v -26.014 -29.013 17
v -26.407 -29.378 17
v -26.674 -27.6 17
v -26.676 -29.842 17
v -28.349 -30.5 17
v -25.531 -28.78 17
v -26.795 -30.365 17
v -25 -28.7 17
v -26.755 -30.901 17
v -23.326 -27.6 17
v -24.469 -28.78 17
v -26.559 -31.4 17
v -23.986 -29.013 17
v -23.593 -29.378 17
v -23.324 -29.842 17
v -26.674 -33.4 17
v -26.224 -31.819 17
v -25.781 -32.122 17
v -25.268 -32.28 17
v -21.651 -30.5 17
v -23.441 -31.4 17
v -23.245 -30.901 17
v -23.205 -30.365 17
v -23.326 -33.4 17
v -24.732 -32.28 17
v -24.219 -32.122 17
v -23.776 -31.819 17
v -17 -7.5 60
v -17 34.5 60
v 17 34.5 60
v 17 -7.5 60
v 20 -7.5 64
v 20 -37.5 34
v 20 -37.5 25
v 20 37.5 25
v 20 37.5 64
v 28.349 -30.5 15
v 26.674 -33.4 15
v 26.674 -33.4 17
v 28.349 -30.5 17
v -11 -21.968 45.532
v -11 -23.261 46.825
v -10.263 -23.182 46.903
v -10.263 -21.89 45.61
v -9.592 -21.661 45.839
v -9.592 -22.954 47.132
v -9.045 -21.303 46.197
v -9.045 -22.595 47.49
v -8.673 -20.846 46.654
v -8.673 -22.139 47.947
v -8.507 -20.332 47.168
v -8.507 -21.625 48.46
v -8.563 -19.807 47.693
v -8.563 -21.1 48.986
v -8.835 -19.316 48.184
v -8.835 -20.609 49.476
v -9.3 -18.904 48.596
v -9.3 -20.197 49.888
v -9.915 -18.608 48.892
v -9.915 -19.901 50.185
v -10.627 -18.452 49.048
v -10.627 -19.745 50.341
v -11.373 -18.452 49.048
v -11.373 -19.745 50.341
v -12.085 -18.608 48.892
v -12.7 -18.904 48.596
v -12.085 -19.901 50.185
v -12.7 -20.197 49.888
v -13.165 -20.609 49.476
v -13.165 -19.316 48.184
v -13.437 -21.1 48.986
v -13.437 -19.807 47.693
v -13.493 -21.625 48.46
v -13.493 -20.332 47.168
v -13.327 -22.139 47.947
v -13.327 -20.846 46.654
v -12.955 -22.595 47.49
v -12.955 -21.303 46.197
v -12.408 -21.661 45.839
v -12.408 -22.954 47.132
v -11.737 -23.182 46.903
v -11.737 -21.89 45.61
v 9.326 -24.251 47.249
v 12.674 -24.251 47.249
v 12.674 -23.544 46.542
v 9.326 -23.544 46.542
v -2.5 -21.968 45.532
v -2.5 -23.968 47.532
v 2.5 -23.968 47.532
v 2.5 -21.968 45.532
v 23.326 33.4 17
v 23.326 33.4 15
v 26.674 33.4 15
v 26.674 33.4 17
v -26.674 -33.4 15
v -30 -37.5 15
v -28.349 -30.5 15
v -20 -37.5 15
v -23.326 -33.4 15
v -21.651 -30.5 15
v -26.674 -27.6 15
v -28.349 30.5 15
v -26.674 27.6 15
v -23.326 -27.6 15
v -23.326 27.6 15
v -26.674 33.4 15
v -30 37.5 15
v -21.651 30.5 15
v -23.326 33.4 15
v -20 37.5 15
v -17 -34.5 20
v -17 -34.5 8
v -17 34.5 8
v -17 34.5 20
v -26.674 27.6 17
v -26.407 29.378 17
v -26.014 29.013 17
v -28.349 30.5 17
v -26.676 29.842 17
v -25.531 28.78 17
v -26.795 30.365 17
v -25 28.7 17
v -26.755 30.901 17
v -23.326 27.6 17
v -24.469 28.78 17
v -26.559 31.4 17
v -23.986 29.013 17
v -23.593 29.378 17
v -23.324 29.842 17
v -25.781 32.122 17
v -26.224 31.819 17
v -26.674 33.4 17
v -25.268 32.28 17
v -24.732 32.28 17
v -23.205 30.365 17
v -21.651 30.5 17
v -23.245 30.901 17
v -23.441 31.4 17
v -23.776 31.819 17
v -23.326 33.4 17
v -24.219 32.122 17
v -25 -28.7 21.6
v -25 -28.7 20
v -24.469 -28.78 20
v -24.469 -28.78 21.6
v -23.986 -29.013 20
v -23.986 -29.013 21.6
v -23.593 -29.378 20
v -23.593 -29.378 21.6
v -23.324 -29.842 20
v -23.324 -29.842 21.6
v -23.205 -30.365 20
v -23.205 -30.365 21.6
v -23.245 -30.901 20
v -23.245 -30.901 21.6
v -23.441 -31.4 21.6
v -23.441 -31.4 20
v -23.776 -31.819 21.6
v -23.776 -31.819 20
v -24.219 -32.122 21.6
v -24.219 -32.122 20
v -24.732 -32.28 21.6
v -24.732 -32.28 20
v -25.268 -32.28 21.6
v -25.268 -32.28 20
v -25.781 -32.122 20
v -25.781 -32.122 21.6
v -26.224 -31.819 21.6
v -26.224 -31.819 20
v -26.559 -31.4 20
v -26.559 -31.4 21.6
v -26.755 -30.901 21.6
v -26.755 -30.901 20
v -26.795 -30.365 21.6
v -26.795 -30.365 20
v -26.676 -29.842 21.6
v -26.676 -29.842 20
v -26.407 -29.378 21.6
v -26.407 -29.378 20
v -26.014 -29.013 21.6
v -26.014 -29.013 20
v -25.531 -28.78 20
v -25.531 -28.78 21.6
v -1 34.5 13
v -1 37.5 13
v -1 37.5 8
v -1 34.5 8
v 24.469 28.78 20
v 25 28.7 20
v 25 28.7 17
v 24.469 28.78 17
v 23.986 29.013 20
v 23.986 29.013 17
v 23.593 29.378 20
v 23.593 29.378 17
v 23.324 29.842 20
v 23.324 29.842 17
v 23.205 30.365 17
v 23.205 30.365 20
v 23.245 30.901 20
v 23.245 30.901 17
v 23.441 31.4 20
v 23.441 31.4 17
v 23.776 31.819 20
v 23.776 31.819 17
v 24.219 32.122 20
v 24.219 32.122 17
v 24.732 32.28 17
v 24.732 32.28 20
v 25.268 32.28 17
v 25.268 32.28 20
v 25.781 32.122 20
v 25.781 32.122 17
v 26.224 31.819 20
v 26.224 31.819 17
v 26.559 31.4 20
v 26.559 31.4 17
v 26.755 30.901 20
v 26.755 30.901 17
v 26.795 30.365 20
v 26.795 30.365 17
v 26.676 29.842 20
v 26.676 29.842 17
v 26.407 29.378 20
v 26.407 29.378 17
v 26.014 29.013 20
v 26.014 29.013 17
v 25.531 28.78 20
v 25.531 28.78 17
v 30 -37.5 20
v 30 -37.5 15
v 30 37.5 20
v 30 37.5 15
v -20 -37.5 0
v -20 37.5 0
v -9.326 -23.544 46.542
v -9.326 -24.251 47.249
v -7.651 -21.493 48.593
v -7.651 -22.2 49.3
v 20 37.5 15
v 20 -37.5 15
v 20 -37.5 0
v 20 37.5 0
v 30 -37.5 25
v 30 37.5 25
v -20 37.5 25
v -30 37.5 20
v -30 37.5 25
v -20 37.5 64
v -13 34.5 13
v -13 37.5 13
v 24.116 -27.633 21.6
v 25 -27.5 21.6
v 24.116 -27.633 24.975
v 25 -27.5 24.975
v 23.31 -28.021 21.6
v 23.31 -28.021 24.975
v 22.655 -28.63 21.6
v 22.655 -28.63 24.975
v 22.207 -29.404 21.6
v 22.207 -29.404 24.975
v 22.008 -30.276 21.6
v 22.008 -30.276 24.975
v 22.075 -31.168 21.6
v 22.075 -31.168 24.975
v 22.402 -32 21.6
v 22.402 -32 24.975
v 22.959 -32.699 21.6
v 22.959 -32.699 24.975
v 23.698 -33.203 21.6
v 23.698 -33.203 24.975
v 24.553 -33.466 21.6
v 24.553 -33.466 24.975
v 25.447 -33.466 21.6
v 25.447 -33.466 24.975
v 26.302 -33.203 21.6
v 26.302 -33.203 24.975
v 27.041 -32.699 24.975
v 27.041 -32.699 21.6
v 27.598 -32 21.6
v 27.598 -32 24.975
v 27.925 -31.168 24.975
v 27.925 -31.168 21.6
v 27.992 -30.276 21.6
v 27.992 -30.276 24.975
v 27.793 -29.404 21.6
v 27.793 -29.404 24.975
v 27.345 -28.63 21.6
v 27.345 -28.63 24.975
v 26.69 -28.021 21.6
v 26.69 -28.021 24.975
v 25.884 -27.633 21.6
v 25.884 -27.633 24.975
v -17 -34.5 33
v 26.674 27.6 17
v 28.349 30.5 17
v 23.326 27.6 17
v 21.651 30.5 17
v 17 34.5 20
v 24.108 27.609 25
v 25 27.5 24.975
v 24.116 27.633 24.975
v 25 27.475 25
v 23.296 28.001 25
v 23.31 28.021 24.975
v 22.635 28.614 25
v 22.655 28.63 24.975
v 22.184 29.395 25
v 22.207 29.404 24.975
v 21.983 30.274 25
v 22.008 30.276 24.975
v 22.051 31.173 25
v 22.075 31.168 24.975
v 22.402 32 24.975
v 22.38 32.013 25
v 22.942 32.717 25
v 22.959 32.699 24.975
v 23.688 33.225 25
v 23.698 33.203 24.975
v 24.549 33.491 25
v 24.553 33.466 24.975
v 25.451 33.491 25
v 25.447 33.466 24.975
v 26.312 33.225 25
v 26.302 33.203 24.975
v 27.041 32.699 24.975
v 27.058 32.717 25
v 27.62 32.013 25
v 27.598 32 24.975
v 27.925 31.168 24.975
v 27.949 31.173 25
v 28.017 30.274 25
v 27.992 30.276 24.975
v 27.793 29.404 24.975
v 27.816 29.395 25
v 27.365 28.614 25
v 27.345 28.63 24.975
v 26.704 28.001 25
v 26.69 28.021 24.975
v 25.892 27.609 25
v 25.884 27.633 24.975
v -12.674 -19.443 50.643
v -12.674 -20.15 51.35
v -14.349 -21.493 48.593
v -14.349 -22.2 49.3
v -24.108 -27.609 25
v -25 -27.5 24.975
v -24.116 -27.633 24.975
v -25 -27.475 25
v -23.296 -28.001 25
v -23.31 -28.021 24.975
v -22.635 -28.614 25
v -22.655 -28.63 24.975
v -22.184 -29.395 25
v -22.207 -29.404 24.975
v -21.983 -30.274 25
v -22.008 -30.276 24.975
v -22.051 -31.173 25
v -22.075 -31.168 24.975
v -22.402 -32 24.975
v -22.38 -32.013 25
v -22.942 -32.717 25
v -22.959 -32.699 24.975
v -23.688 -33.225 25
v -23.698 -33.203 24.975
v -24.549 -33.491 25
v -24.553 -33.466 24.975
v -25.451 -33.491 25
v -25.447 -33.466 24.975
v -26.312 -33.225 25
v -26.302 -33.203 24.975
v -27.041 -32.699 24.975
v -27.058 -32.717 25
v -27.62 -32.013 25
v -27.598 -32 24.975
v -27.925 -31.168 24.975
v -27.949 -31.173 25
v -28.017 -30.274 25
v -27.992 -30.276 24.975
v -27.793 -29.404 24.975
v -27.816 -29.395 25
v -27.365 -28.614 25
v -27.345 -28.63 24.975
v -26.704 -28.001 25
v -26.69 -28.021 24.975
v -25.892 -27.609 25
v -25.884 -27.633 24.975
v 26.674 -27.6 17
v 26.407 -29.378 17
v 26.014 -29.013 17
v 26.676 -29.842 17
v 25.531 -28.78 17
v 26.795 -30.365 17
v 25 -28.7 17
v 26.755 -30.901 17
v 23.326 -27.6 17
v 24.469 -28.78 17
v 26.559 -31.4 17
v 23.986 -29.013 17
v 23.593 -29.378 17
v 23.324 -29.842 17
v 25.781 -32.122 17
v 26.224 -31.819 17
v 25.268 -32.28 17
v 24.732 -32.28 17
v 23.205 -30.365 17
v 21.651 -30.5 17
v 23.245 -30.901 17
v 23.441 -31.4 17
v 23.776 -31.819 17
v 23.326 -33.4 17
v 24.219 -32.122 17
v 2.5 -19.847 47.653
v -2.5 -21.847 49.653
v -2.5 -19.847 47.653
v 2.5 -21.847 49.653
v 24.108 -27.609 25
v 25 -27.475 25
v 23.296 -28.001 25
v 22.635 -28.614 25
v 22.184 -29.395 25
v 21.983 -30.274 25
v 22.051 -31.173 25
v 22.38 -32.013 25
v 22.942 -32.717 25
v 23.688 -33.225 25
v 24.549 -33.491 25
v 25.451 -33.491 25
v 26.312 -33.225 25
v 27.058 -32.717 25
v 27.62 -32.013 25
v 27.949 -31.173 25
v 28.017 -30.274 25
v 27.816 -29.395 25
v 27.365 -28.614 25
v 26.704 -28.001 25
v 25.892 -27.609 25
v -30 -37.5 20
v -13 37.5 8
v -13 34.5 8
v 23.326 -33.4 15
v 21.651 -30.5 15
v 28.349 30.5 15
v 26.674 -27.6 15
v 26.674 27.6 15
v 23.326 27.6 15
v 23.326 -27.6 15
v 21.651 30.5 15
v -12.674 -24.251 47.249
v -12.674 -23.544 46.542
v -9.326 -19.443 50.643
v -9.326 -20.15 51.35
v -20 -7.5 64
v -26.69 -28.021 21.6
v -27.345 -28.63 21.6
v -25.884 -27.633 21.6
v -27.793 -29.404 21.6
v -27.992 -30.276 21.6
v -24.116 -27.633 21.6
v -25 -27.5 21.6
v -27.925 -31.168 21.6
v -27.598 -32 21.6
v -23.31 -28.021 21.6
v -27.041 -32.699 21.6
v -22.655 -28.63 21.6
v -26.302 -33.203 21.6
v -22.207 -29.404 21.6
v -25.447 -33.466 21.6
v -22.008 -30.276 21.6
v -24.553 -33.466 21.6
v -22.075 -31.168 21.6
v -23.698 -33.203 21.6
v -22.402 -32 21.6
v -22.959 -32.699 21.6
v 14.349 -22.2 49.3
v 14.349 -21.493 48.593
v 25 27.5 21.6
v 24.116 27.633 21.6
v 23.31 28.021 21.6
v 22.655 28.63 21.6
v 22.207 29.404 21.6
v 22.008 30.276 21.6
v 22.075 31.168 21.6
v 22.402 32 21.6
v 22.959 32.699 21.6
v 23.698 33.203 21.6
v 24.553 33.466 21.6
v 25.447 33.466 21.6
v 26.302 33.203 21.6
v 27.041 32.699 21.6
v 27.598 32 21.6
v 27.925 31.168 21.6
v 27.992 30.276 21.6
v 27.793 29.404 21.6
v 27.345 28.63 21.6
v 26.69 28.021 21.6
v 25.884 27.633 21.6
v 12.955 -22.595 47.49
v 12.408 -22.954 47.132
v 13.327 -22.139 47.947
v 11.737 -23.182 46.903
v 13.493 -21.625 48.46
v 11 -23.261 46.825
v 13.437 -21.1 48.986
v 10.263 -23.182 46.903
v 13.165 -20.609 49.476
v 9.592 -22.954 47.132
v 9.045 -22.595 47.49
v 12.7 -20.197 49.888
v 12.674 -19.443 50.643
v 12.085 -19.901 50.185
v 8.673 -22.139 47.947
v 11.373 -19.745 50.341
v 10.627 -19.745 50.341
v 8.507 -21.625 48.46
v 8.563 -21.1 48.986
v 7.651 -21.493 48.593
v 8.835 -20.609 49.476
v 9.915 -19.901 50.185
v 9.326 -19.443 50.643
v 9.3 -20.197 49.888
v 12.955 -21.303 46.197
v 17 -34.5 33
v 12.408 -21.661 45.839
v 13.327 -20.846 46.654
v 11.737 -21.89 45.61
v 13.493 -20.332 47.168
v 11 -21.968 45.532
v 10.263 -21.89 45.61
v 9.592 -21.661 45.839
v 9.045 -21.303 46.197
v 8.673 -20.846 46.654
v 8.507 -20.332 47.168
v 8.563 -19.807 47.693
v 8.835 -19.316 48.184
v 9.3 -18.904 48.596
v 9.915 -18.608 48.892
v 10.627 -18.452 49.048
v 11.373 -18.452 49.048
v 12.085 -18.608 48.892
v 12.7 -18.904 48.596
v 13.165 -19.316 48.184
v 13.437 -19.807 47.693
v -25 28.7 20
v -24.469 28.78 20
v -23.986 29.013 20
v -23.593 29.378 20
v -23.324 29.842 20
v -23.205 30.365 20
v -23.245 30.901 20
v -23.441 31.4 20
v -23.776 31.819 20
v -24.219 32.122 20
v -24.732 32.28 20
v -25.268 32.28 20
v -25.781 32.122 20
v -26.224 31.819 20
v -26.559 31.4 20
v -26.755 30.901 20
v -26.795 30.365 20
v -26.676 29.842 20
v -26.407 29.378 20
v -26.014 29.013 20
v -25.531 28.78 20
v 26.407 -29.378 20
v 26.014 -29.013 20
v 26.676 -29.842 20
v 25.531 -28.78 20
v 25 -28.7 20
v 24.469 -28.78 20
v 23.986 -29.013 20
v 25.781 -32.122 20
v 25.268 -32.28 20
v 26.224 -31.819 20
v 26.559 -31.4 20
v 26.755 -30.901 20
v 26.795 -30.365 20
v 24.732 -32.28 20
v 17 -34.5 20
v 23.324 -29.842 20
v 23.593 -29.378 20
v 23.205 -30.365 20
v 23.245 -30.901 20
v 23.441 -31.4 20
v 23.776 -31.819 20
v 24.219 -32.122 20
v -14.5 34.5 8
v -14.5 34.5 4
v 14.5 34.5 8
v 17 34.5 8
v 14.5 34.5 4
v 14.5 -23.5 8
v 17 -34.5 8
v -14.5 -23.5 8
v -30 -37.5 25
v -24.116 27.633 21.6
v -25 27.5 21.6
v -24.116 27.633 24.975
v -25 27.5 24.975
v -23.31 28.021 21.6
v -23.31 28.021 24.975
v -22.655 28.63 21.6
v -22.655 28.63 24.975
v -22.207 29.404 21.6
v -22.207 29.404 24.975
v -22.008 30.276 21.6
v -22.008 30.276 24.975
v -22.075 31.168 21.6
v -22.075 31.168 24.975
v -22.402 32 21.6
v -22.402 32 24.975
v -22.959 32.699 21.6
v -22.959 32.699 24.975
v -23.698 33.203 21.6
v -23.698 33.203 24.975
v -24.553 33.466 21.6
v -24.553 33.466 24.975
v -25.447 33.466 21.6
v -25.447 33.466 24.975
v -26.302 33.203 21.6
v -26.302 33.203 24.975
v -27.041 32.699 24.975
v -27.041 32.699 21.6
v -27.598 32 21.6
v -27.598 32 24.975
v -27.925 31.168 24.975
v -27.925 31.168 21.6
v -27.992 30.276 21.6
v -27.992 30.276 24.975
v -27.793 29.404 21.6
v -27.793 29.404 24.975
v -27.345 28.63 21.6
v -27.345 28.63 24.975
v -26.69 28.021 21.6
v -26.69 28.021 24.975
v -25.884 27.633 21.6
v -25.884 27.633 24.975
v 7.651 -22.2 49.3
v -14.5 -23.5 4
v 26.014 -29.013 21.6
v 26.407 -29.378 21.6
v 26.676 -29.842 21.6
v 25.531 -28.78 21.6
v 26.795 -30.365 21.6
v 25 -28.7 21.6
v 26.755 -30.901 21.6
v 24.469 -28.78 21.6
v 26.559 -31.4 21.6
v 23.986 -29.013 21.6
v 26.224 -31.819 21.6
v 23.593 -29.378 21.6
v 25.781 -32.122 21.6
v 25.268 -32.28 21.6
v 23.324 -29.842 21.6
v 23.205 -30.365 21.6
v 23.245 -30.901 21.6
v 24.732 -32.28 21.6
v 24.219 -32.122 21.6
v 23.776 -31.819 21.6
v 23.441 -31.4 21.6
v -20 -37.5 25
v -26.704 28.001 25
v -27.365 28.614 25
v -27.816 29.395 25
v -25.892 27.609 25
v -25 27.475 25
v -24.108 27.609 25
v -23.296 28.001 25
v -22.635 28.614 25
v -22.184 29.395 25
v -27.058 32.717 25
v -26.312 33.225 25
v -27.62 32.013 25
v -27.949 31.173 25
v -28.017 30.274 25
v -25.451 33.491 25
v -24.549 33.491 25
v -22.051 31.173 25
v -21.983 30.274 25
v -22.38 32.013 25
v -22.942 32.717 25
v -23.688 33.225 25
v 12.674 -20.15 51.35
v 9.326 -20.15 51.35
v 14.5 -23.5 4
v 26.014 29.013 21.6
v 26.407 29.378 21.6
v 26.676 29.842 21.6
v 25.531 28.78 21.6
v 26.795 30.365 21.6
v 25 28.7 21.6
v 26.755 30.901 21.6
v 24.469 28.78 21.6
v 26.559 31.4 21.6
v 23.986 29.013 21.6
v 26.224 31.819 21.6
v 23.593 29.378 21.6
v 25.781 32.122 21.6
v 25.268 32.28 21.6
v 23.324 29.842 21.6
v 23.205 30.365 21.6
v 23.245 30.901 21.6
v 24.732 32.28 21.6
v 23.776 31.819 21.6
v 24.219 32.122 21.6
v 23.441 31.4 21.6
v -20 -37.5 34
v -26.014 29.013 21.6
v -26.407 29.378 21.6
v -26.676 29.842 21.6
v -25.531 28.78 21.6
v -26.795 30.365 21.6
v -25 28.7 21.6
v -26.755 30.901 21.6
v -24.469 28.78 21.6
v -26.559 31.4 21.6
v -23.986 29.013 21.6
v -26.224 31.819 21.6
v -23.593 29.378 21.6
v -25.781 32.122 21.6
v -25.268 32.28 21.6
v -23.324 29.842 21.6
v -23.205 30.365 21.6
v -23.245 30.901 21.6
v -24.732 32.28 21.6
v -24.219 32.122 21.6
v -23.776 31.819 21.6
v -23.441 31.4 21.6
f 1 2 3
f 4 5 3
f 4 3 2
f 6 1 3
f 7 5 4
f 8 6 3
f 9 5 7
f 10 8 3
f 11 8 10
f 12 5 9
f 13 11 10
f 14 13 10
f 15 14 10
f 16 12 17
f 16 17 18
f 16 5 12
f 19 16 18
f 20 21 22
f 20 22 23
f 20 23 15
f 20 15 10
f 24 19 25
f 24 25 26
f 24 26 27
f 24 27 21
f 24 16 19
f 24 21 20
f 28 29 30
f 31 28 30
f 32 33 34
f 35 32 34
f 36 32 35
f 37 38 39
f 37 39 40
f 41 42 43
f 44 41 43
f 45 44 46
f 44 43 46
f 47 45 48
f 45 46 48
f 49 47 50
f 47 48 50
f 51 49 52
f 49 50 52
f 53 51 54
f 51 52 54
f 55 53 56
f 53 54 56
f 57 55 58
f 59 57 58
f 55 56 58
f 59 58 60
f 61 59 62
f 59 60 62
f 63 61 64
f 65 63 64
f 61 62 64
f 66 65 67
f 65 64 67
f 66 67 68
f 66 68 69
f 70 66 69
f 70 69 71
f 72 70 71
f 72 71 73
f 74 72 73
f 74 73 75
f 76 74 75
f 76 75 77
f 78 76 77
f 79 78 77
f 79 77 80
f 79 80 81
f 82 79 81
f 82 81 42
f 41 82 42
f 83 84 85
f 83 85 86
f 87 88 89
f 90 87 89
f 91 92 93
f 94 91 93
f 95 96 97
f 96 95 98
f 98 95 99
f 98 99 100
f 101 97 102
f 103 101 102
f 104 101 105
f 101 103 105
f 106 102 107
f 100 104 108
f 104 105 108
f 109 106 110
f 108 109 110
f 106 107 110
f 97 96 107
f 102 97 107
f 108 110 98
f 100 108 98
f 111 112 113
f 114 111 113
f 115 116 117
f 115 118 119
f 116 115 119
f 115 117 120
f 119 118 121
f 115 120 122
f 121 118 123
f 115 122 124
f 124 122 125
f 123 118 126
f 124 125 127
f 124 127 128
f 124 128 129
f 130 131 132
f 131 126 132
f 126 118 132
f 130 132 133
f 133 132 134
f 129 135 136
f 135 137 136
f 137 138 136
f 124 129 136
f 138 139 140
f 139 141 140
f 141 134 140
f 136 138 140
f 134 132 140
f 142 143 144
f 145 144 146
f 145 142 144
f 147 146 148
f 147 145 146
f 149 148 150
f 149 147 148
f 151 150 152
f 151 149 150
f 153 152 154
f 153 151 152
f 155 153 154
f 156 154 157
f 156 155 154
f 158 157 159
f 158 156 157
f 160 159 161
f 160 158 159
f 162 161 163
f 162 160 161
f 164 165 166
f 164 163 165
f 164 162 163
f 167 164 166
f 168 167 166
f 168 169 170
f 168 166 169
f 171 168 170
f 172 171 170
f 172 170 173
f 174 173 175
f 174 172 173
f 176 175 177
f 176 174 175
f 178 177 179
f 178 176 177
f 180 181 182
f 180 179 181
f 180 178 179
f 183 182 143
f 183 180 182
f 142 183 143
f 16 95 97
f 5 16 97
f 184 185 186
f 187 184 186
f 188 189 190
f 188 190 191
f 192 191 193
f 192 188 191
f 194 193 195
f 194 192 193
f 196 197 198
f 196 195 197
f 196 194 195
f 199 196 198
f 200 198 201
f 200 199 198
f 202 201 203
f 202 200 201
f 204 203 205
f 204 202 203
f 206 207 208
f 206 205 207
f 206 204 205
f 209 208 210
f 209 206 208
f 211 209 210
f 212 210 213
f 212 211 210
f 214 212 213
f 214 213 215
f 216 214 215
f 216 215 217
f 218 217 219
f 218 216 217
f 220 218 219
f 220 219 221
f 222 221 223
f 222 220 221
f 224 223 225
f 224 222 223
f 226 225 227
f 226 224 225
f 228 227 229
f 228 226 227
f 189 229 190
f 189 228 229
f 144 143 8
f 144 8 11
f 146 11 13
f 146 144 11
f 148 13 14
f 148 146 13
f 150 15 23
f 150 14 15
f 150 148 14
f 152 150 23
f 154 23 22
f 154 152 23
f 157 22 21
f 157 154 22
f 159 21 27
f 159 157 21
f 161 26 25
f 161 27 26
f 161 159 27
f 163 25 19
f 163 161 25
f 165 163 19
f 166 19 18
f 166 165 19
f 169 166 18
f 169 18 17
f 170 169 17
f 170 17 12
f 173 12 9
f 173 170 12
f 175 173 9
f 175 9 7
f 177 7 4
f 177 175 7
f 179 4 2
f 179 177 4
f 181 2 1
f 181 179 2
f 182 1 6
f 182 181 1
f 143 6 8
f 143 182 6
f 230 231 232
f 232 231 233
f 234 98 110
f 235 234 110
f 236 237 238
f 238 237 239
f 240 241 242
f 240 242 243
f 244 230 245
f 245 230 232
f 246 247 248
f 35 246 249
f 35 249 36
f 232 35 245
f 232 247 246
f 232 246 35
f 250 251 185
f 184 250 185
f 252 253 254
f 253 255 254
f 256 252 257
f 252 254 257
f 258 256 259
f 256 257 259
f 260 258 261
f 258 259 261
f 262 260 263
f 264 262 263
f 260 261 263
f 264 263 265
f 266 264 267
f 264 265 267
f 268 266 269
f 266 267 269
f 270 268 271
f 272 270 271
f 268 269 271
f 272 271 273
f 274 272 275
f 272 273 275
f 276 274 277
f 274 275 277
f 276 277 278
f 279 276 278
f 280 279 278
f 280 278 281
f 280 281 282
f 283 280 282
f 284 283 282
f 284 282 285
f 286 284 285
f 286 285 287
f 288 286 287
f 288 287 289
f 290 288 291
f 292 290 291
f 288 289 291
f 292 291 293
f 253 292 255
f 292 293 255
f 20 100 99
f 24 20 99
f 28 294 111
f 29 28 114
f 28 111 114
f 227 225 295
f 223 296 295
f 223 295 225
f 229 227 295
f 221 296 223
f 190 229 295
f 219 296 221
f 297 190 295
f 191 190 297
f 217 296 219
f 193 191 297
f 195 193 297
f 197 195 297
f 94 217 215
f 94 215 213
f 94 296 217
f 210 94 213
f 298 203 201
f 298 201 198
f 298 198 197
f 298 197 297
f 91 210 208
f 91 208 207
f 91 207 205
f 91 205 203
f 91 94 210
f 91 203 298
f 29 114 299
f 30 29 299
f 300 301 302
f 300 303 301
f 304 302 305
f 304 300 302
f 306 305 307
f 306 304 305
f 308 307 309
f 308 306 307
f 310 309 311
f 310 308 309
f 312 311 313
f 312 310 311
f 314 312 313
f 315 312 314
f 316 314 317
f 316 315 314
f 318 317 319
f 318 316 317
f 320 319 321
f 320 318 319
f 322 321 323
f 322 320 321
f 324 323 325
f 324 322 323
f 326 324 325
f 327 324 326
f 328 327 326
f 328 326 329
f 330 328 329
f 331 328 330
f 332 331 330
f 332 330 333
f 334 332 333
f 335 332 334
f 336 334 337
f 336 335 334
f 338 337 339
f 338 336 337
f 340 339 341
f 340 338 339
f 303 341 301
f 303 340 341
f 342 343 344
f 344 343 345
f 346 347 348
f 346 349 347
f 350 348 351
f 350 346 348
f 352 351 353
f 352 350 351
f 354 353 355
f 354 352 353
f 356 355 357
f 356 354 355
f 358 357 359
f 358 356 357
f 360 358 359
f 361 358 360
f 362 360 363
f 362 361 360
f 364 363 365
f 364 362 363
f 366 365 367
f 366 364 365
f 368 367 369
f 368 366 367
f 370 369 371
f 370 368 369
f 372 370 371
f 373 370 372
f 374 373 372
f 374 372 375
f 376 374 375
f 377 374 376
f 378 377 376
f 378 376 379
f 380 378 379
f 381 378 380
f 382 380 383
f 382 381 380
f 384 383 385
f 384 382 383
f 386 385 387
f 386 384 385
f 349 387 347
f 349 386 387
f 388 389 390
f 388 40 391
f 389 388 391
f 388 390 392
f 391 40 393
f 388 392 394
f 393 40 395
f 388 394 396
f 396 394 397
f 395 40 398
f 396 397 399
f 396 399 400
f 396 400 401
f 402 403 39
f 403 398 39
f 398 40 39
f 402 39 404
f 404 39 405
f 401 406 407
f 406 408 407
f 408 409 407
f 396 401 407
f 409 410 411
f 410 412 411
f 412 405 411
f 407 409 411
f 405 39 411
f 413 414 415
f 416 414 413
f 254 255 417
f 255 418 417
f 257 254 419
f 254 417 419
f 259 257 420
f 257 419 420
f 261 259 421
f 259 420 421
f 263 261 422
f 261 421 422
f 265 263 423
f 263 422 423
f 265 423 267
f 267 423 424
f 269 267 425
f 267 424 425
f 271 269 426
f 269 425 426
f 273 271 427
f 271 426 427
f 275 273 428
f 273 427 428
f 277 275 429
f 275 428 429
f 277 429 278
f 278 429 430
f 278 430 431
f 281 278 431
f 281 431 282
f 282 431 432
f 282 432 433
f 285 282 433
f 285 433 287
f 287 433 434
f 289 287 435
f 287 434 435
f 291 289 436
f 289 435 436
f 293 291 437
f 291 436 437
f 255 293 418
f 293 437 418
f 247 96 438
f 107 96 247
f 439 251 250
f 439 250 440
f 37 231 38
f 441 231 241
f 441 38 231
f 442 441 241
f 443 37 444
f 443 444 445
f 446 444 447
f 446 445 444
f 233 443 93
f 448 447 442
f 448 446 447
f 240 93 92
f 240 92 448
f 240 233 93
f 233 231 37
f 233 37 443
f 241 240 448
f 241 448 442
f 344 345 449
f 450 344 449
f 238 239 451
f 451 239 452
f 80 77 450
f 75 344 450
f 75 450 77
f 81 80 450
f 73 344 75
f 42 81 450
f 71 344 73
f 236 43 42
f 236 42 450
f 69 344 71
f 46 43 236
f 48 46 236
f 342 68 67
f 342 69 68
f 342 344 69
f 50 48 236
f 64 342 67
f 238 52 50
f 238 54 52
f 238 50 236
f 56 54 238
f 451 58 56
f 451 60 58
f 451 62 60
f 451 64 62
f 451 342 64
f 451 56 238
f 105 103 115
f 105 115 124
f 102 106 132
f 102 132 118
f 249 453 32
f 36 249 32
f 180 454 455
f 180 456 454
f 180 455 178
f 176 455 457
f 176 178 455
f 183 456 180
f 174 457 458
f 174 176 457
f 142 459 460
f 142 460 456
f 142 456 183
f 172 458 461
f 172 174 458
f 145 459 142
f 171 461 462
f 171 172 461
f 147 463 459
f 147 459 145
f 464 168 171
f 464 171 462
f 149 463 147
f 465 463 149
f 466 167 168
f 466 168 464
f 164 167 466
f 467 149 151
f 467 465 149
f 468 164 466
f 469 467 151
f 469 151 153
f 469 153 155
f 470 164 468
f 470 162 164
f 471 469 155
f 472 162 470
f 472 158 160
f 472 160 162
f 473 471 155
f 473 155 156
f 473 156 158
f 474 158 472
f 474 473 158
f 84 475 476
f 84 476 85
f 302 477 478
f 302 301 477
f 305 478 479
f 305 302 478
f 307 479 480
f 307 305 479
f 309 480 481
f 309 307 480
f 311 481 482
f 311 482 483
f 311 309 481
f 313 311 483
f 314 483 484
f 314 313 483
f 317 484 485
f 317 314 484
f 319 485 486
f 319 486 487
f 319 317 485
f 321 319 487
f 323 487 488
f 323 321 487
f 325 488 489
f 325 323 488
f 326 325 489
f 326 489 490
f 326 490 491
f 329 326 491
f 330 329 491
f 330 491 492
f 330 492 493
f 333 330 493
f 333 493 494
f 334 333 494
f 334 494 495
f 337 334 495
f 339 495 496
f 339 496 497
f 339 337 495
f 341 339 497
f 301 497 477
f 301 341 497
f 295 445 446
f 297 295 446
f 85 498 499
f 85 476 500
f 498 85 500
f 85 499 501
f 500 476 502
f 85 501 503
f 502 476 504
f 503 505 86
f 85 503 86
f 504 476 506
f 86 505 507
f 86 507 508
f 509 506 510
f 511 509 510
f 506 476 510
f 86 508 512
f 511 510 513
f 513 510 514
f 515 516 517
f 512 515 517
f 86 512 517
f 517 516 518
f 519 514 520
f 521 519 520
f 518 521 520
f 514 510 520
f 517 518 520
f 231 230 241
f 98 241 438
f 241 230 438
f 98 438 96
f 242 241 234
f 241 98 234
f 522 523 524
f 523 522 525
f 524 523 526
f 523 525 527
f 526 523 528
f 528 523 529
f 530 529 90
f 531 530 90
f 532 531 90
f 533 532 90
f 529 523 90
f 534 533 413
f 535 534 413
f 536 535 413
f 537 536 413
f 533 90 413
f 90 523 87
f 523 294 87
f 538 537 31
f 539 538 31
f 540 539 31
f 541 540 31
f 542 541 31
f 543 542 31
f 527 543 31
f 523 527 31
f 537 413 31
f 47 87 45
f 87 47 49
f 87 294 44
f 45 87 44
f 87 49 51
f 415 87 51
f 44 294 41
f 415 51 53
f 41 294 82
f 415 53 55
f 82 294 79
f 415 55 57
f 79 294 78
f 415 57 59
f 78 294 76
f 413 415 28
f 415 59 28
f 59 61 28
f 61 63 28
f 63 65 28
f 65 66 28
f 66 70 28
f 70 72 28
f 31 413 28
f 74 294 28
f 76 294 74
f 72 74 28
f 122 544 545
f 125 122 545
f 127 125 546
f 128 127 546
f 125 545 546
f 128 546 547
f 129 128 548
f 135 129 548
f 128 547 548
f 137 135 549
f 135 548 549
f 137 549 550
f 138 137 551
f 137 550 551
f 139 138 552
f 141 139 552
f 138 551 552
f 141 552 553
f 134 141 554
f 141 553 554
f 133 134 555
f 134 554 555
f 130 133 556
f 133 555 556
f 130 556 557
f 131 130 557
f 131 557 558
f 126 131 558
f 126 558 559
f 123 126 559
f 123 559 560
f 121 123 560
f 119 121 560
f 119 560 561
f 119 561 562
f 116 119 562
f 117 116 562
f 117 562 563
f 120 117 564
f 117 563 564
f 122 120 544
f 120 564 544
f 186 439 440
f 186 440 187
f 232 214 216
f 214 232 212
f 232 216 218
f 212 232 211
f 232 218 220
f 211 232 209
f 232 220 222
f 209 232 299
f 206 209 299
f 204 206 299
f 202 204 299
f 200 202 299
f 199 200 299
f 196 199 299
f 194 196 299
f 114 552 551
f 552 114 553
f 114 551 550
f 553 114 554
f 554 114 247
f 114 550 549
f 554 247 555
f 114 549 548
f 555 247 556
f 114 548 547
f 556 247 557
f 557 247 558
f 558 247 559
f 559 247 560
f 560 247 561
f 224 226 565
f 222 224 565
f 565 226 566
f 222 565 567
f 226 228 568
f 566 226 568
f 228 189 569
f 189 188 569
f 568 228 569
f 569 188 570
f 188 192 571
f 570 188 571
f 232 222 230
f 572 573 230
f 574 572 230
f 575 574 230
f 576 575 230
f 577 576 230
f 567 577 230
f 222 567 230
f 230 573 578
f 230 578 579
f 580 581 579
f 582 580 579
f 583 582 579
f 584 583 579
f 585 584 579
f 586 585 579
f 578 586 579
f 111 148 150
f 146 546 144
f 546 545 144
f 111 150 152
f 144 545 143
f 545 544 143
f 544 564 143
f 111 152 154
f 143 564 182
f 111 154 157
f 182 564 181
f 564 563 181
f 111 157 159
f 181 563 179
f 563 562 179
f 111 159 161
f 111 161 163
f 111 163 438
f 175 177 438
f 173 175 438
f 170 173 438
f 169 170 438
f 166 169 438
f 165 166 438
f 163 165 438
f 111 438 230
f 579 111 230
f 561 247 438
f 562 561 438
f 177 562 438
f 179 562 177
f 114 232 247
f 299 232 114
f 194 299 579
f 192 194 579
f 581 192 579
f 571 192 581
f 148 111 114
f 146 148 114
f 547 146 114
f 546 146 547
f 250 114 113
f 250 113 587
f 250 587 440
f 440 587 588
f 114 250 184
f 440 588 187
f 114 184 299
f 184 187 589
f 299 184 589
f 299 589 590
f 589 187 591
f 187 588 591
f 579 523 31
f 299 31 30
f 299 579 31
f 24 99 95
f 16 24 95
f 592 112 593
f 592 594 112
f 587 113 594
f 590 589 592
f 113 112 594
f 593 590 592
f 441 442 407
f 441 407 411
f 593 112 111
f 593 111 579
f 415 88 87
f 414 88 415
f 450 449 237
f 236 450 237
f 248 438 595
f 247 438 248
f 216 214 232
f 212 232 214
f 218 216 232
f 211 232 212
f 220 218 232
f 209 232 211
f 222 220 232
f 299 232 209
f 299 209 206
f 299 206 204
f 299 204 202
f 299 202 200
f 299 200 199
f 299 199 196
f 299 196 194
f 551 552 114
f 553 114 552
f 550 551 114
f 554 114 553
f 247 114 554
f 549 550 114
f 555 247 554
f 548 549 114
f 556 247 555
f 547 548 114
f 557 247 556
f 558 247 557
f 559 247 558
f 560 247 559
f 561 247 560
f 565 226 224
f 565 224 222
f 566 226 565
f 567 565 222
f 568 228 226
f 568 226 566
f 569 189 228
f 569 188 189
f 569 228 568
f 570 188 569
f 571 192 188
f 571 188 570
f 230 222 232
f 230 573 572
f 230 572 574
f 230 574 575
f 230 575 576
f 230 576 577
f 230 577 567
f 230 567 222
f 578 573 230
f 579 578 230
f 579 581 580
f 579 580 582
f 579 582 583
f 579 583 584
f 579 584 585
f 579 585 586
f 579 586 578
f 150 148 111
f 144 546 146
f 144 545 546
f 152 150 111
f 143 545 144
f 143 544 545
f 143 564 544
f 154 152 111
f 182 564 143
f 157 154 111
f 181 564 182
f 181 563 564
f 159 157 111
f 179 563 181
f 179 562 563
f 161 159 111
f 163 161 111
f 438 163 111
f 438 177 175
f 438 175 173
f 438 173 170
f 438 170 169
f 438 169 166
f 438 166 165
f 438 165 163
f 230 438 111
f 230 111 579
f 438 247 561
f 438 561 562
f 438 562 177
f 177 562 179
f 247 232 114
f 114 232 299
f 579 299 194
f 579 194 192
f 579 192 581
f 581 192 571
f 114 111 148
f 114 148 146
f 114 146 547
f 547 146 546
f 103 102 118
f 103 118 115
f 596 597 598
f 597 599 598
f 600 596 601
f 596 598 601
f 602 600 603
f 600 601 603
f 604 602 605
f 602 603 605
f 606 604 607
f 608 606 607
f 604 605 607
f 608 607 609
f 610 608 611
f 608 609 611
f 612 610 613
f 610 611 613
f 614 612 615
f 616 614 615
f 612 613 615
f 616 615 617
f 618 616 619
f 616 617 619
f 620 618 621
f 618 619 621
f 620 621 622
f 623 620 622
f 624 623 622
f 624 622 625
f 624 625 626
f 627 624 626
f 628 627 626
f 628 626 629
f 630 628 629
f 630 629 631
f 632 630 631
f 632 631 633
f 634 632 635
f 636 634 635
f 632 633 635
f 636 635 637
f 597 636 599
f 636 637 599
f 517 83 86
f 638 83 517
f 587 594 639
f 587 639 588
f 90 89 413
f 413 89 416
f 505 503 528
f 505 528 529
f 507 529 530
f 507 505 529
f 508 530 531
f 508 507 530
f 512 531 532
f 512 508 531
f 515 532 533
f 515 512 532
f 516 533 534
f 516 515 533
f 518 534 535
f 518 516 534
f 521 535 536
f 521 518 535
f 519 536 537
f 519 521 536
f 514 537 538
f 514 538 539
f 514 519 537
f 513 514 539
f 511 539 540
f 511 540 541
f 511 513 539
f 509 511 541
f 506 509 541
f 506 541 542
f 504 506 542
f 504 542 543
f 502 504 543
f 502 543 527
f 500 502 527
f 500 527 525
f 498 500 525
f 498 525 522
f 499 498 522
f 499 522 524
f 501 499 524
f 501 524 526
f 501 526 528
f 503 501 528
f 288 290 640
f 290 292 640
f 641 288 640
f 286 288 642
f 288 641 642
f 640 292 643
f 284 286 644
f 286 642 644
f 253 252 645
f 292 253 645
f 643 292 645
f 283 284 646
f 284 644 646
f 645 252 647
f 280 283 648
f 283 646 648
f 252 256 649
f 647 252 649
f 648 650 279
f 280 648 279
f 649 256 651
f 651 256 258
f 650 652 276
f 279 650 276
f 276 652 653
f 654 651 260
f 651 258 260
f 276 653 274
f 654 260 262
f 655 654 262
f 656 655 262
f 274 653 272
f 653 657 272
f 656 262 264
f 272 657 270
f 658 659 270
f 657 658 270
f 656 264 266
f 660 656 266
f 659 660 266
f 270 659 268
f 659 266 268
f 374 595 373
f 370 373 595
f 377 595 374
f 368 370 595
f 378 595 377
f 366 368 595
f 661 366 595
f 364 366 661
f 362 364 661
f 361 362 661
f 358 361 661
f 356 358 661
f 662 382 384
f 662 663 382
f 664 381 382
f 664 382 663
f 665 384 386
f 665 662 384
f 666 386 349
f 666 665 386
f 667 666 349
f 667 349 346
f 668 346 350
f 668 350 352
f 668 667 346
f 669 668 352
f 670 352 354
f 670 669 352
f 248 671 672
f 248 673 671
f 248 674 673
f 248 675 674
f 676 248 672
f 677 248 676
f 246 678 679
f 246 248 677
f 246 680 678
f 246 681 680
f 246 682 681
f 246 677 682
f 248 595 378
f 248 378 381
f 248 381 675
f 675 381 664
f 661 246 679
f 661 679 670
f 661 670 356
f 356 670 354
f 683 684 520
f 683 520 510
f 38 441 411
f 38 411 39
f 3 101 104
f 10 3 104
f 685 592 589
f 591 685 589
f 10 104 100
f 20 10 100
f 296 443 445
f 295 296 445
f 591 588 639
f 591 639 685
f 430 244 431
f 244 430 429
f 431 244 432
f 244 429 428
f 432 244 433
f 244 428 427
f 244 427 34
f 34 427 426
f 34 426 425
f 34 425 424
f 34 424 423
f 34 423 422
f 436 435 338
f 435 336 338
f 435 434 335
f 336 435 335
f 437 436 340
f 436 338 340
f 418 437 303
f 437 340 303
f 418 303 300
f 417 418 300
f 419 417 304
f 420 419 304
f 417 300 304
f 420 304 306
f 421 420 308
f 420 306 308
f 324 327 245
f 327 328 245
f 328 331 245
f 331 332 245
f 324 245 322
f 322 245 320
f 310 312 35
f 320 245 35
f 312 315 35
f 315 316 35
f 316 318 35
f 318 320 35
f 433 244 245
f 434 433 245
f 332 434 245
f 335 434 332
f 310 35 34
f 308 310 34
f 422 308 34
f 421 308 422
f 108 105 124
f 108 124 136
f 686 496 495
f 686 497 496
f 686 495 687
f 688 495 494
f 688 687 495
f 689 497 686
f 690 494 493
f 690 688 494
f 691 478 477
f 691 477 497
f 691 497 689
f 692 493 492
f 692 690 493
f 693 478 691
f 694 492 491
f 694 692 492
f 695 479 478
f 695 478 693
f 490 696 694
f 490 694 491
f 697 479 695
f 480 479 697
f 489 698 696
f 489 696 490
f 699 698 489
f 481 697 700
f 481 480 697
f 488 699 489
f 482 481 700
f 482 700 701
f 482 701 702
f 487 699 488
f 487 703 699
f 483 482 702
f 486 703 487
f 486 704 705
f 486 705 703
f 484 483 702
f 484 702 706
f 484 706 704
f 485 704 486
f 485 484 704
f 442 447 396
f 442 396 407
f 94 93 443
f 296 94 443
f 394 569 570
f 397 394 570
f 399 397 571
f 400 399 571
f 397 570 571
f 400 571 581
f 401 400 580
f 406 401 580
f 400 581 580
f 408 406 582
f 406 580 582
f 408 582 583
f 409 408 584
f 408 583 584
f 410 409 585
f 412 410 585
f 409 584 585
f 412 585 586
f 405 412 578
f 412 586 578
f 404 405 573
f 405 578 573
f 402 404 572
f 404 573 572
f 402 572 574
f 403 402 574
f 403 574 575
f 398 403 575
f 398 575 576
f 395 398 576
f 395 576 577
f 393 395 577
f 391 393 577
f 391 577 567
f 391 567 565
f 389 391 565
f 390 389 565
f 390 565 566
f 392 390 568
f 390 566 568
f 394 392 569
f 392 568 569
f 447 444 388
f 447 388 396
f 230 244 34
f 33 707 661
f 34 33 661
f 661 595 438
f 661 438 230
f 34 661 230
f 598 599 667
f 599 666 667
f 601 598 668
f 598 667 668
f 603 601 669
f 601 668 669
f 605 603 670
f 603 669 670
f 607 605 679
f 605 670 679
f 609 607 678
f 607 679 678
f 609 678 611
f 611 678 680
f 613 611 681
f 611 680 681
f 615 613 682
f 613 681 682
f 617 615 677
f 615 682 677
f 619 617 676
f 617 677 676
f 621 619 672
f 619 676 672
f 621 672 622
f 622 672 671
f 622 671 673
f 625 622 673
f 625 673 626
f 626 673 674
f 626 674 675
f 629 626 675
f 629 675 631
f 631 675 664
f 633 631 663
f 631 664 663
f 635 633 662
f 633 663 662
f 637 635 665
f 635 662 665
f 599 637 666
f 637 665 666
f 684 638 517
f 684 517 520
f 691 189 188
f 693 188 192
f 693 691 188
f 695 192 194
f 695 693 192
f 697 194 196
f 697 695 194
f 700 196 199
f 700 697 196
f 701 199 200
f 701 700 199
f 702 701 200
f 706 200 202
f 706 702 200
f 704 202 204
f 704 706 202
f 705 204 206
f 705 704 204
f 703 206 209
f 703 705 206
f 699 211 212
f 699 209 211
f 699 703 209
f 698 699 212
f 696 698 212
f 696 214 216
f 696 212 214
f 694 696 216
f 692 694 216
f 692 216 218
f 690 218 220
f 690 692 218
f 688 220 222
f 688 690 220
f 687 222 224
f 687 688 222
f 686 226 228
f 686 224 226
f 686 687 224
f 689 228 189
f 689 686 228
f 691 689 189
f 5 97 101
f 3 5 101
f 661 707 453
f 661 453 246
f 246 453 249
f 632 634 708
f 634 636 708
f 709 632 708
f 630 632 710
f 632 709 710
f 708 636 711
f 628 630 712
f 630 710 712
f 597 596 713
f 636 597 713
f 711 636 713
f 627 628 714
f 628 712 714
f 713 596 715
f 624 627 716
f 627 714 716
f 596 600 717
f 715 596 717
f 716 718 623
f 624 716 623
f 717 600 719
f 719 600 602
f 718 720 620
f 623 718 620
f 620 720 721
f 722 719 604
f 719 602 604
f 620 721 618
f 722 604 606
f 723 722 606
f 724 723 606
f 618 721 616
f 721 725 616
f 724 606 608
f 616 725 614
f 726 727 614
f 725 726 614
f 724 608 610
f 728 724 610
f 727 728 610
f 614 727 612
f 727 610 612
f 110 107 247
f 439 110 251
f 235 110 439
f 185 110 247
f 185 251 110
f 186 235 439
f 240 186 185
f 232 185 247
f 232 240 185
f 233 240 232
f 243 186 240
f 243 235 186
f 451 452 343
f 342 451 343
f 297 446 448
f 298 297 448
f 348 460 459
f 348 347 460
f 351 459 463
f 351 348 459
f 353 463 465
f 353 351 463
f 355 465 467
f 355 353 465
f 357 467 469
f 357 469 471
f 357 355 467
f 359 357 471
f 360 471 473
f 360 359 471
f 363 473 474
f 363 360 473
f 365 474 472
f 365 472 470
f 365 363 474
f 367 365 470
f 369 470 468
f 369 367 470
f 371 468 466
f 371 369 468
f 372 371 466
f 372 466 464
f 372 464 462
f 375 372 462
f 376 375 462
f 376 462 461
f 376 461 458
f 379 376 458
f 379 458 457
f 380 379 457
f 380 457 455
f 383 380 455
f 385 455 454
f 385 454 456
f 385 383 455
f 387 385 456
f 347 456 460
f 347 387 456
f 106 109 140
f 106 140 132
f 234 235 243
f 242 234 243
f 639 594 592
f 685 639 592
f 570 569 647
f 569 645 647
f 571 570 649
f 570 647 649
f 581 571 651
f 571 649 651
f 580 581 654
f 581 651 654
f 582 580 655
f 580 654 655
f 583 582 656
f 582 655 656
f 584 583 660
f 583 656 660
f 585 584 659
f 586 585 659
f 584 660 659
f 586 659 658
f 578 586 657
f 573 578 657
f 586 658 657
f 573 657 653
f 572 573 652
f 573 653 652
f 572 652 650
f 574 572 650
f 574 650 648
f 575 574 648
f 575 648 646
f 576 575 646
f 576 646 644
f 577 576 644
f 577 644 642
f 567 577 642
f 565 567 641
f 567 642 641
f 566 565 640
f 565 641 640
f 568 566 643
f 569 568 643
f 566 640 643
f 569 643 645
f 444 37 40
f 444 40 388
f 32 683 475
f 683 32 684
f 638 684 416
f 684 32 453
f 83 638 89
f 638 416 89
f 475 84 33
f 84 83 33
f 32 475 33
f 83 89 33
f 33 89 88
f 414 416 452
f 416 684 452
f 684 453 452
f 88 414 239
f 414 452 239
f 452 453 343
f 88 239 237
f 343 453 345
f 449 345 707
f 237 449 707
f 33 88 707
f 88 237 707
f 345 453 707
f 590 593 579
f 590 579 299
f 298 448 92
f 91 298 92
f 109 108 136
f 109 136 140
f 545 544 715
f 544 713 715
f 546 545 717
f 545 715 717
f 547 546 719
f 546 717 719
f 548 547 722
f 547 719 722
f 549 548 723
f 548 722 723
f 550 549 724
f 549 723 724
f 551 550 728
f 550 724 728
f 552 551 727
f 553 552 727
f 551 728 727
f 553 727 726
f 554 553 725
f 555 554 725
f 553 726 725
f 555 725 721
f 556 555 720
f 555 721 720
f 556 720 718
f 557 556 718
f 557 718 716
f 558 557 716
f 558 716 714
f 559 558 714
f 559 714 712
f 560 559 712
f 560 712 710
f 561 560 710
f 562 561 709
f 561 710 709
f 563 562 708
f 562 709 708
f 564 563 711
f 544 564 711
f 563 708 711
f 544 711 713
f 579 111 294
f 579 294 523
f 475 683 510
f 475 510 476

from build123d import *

# Parameters (mm, degrees)
SKETCH_1_W                     = 40
SKETCH_1_H                     = 75
EXTRUDE_1_DEPTH                = 30
SHELL_1_T                      = -3
SKETCH_2_W                     = 34
SKETCH_2_H                     = 69
EXTRUDE_2_DEPTH                = 5
SKETCH_3_W                     = 29
SKETCH_3_H                     = 58
CUT_EXTRUDE_1_DEPTH            = 4
SKETCH_4_W                     = 12
SKETCH_4_H                     = 5
CUT_EXTRUDE_2_DEPTH            = 3
SKETCH_5_W                     = 40
SKETCH_5_H                     = 75
SKETCH_5_W_2                   = 34
SKETCH_5_H_2                   = 69
EXTRUDE_5_DEPTH                = 30
CUT_EXTRUDE_START              = -40
CUT_EXTRUDE_5_DEPTH            = 40
SKETCH_8_W                     = 40
SKETCH_8_H                     = 45
EXTRUDE_6_DEPTH                = 4
SWEEP_START                    = -20
SWEEP_1_DEPTH                  = 40
CUT_EXTRUDE_6_REACH            = 85.926
SKETCH_12_R                    = 2.5
CUT_EXTRUDE_7_REACH            = 85.926
SKETCH_14_W                    = 5
SKETCH_14_H                    = 3
SKETCH_22_W                    = 10
SKETCH_22_H                    = 75
EXTRUDE_8_DEPTH                = 5
CUT_EXTRUDE_9_DEPTH            = 2
MIRROR_6_COPY_2_DEPTH          = 2
SPLIT_BODIES_2_SURFACE_1_BACK  = 116.417
SPLIT_BODIES_2_SURFACE_1_DEPTH = 232.834
SPLIT_BODIES_2_SURFACE_2_BACK  = 116.417
SPLIT_BODIES_2_SURFACE_2_DEPTH = 232.834
CUT_EXTRUDE_10_DEPTH           = 1


# Read off the part's stored shape, not the designer's step: 切除-拉伸5, 扫描1
with BuildPart() as part:
    # 草图1 → 凸台-拉伸1 (new body)
    with BuildSketch(Plane.XY):
        Rectangle(SKETCH_1_W, SKETCH_1_H)
    extrude(amount=EXTRUDE_1_DEPTH)

    # 抽壳1
    shell_1_openings = [part.faces().sort_by_distance(p)[0] for p in [
        (0, 0, 30),
    ]]
    offset(amount=SHELL_1_T, openings=shell_1_openings, kind=Kind.INTERSECTION)

    # 草图2 → 凸台-拉伸2 (add)
    with BuildSketch(Plane.XY.offset(3)):
        Rectangle(SKETCH_2_W, SKETCH_2_H)
    extrude(amount=EXTRUDE_2_DEPTH)

    # 草图3 → 切除-拉伸1 (cut)
    with BuildSketch(Plane.XY.offset(8)):
        with Locations((0, 5.5)):
            Rectangle(SKETCH_3_W, SKETCH_3_H)
    extrude(amount=-CUT_EXTRUDE_1_DEPTH, mode=Mode.SUBTRACT)

    # 草图4 → 切除-拉伸2 (cut)
    with BuildSketch(Plane(origin=(0, 37.5, 0), x_dir=(1, 0, 0), z_dir=(0, 1, 0))):
        with Locations((-7, -10.5)):
            Rectangle(SKETCH_4_W, SKETCH_4_H)
    extrude(amount=-CUT_EXTRUDE_2_DEPTH, mode=Mode.SUBTRACT)

    # 草图5 → 凸台-拉伸5 (add)
    with BuildSketch(Plane.XY.offset(30)):
        Rectangle(SKETCH_5_W, SKETCH_5_H)
        Rectangle(SKETCH_5_W_2, SKETCH_5_H_2, mode=Mode.SUBTRACT)
    extrude(amount=EXTRUDE_5_DEPTH)

    # 切除-拉伸5 outline → 切除-拉伸5 (cut)
    with BuildSketch(Plane.ZY.offset(20).offset(CUT_EXTRUDE_START)):
        Polygon((60, -7.5), (30, -37.5), (60, -37.5), align=None)
    extrude(amount=CUT_EXTRUDE_5_DEPTH, mode=Mode.SUBTRACT)

    # 草图8 → 凸台-拉伸6 (add)
    with BuildSketch(Plane.XY.offset(60)):
        with Locations((0, 15)):
            Rectangle(SKETCH_8_W, SKETCH_8_H)
    extrude(amount=EXTRUDE_6_DEPTH)

    # 扫描1 outline → 扫描1 (add)
    with BuildSketch(Plane.YZ.offset(SWEEP_START)):
        Polygon((-37.5, 34), (-37.5, 30), (-7.5, 60), (-7.5, 64), align=None)
    extrude(amount=SWEEP_1_DEPTH)

    # 草图12 → 切除-拉伸6 (cut, up to next)
    with BuildSketch(Plane(origin=(0, -35.75, 35.75), x_dir=(1, 0, 0), z_dir=(0, -0.7071067811865487, 0.7071067811865465)), mode=Mode.PRIVATE) as cut_extrude_6_sk1:
        with Locations(Location((-11, 19.162131789, 0), (0, 0, 270))):
            Circle(SKETCH_12_R)
    cut_extrude_6_tool1 = extrude(cut_extrude_6_sk1.sketch, amount=-CUT_EXTRUDE_6_REACH, mode=Mode.PRIVATE) & part.part
    cut_extrude_6 = cut_extrude_6_tool1.solids().sort_by_distance((-11, -22.200327, 49.299673))[0]
    add(cut_extrude_6, mode=Mode.SUBTRACT)

    # 镜向1: 切除-拉伸6 across plane
    add(cut_extrude_6.mirror(Plane(origin=(0, 0, 0), x_dir=(0, 0, 1), z_dir=(1, 0, 0))), mode=Mode.SUBTRACT)

    # 草图14 → 切除-拉伸7 (cut, up to next)
    with BuildSketch(Plane(origin=(0, -35.75, 35.75), x_dir=(1, 0, 0), z_dir=(0, -0.7071067811865487, 0.7071067811865465)), mode=Mode.PRIVATE) as cut_extrude_7_sk1:
        with Locations((0, 18.162131789)):
            Rectangle(SKETCH_14_W, SKETCH_14_H)
    cut_extrude_7_tool1 = extrude(cut_extrude_7_sk1.sketch, amount=-CUT_EXTRUDE_7_REACH, mode=Mode.PRIVATE) & part.part
    add(cut_extrude_7_tool1.solids().sort_by_distance((0, -22.907433, 48.592567))[0], mode=Mode.SUBTRACT)

    # 草图22 → 凸台-拉伸8 (add, symmetric)
    with BuildSketch(Plane(origin=(0, 0, 20), x_dir=(-1, 0, 0), z_dir=(0, 0, -1))):
        with Locations((-25, 0)):
            Rectangle(SKETCH_22_W, SKETCH_22_H)
    extrude_8 = extrude(amount=EXTRUDE_8_DEPTH, both=True)

    # 草图24 → M3 六角圆柱头螺钉的柱形沉头孔2 (revolve, cut)
    with BuildSketch(Plane(origin=(25, 30.5, 25), x_dir=(0, -1, 0), z_dir=(1, 0, 0))):
        Polygon((0, 0), (0, 10), (1.8, 10), (1.8, 3.4), (3, 3.4), (3, 0.025), (3.025, 0), align=None)
    hole_wizard_m3_2 = revolve(axis=Axis((25, 30.5, 31.35), (0, 0, -1)), mode=Mode.SUBTRACT)

    # 草图25 → 切除-拉伸9 (cut)
    with BuildSketch(Plane(origin=(0, 0, 15), x_dir=(-1, 0, 0), z_dir=(0, 0, -1))):
        Polygon((-28.348631561, 30.5), (-26.674315781, 27.6), (-23.325684219, 27.6), (-21.651368439, 30.5), (-23.325684219, 33.4), (-26.674315781, 33.4), align=None)
    cut_extrude_9 = extrude(amount=-CUT_EXTRUDE_9_DEPTH, mode=Mode.SUBTRACT)

    # 镜向4: M3 六角圆柱头螺钉的柱形沉头孔2, 切除-拉伸9 across plane
    add(hole_wizard_m3_2.mirror(Plane.ZX), mode=Mode.SUBTRACT)
    add(cut_extrude_9.mirror(Plane.ZX), mode=Mode.SUBTRACT)

    # 镜向6: 凸台-拉伸8, M3 六角圆柱头螺钉的柱形沉头孔2, 切除-拉伸9 across plane
    add(extrude_8.mirror(Plane(origin=(0, 0, 0), x_dir=(0, 0, 1), z_dir=(1, 0, 0))))
    add(hole_wizard_m3_2.mirror(Plane(origin=(0, 0, 0), x_dir=(0, 0, 1), z_dir=(1, 0, 0))), mode=Mode.SUBTRACT)
    add(cut_extrude_9.mirror(Plane(origin=(0, 0, 0), x_dir=(0, 0, 1), z_dir=(1, 0, 0))), mode=Mode.SUBTRACT)

    # 镜向6 copy 1 sketch → 镜向6 copy 1 (revolve, cut)
    with BuildSketch(Plane(origin=(-25, -30.5, 25), x_dir=(0, 1, 0), z_dir=(-1, 0, 0))):
        Polygon((0, 0), (0, 10), (1.8, 10), (1.8, 3.4), (3, 3.4), (3, 0.025), (3.025, 0), align=None)
    revolve(axis=Axis((-25, -30.5, 31.35), (0, 0, -1)), mode=Mode.SUBTRACT)

    # 镜向6 copy 2 sketch → 镜向6 copy 2 (cut)
    with BuildSketch(Plane(origin=(0, 0, 15), x_dir=(1, 0, 0), z_dir=(0, 0, -1))):
        Polygon((-28.348631561, 30.5), (-26.674315781, 27.6), (-23.325684219, 27.6), (-21.651368439, 30.5), (-23.325684219, 33.4), (-26.674315781, 33.4), align=None)
    extrude(amount=-MIRROR_6_COPY_2_DEPTH, mode=Mode.SUBTRACT)


with BuildPart() as body_2:
    # Split Bodies 2: the piece behind the surface
    add(part.part)
    # Split Bodies 2 surface: a surface, the sketch's curves swept straight by 232.834 mm
    with BuildLine(Plane(origin=(30, 0, 0), x_dir=(0, 0, -1), z_dir=(1, 0, 0)).offset(-SPLIT_BODIES_2_SURFACE_1_BACK), mode=Mode.PRIVATE) as split_bodies_2_surface_1_path:
        Line((-20, 42.094632645), (-20, -46.024022385))
    split_bodies_2_surface_1 = Shell.extrude(split_bodies_2_surface_1_path.wire(), (1 * SPLIT_BODIES_2_SURFACE_1_DEPTH, 0 * SPLIT_BODIES_2_SURFACE_1_DEPTH, 0 * SPLIT_BODIES_2_SURFACE_1_DEPTH))
    split(bisect_by=split_bodies_2_surface_1, keep=Keep.BOTTOM)

    # 草图27 → 切除-拉伸10 (cut)
    with BuildSketch(Plane(origin=(0, -35.75, 35.75), x_dir=(1, 0, 0), z_dir=(0, -0.7071067811865487, 0.7071067811865465))):
        Polygon((-14.348631561, 19.162131789), (-12.674315781, 16.262131789), (-9.325684219, 16.262131789), (-7.651368439, 19.162131789), (-9.325684219, 22.062131789), (-12.674315781, 22.062131789), align=None)
    cut_extrude_10 = extrude(amount=-CUT_EXTRUDE_10_DEPTH, mode=Mode.SUBTRACT)

    # 镜向7: 切除-拉伸10 across plane
    add(cut_extrude_10.mirror(Plane(origin=(0, 0, 0), x_dir=(0, 0, 1), z_dir=(1, 0, 0))), mode=Mode.SUBTRACT)


with BuildPart() as part_1:
    add(part.part)

    # Split Bodies 2: split by a surface, the side it looks to stays
    # Split Bodies 2 surface: a surface, the sketch's curves swept straight by 232.834 mm
    with BuildLine(Plane(origin=(30, 0, 0), x_dir=(0, 0, -1), z_dir=(1, 0, 0)).offset(-SPLIT_BODIES_2_SURFACE_2_BACK), mode=Mode.PRIVATE) as split_bodies_2_surface_2_path:
        Line((-20, 42.094632645), (-20, -46.024022385))
    split_bodies_2_surface_2 = Shell.extrude(split_bodies_2_surface_2_path.wire(), (1 * SPLIT_BODIES_2_SURFACE_2_DEPTH, 0 * SPLIT_BODIES_2_SURFACE_2_DEPTH, 0 * SPLIT_BODIES_2_SURFACE_2_DEPTH))
    split(bisect_by=split_bodies_2_surface_2, keep=Keep.TOP)


solid = Compound([body_2.part, part_1.part])
